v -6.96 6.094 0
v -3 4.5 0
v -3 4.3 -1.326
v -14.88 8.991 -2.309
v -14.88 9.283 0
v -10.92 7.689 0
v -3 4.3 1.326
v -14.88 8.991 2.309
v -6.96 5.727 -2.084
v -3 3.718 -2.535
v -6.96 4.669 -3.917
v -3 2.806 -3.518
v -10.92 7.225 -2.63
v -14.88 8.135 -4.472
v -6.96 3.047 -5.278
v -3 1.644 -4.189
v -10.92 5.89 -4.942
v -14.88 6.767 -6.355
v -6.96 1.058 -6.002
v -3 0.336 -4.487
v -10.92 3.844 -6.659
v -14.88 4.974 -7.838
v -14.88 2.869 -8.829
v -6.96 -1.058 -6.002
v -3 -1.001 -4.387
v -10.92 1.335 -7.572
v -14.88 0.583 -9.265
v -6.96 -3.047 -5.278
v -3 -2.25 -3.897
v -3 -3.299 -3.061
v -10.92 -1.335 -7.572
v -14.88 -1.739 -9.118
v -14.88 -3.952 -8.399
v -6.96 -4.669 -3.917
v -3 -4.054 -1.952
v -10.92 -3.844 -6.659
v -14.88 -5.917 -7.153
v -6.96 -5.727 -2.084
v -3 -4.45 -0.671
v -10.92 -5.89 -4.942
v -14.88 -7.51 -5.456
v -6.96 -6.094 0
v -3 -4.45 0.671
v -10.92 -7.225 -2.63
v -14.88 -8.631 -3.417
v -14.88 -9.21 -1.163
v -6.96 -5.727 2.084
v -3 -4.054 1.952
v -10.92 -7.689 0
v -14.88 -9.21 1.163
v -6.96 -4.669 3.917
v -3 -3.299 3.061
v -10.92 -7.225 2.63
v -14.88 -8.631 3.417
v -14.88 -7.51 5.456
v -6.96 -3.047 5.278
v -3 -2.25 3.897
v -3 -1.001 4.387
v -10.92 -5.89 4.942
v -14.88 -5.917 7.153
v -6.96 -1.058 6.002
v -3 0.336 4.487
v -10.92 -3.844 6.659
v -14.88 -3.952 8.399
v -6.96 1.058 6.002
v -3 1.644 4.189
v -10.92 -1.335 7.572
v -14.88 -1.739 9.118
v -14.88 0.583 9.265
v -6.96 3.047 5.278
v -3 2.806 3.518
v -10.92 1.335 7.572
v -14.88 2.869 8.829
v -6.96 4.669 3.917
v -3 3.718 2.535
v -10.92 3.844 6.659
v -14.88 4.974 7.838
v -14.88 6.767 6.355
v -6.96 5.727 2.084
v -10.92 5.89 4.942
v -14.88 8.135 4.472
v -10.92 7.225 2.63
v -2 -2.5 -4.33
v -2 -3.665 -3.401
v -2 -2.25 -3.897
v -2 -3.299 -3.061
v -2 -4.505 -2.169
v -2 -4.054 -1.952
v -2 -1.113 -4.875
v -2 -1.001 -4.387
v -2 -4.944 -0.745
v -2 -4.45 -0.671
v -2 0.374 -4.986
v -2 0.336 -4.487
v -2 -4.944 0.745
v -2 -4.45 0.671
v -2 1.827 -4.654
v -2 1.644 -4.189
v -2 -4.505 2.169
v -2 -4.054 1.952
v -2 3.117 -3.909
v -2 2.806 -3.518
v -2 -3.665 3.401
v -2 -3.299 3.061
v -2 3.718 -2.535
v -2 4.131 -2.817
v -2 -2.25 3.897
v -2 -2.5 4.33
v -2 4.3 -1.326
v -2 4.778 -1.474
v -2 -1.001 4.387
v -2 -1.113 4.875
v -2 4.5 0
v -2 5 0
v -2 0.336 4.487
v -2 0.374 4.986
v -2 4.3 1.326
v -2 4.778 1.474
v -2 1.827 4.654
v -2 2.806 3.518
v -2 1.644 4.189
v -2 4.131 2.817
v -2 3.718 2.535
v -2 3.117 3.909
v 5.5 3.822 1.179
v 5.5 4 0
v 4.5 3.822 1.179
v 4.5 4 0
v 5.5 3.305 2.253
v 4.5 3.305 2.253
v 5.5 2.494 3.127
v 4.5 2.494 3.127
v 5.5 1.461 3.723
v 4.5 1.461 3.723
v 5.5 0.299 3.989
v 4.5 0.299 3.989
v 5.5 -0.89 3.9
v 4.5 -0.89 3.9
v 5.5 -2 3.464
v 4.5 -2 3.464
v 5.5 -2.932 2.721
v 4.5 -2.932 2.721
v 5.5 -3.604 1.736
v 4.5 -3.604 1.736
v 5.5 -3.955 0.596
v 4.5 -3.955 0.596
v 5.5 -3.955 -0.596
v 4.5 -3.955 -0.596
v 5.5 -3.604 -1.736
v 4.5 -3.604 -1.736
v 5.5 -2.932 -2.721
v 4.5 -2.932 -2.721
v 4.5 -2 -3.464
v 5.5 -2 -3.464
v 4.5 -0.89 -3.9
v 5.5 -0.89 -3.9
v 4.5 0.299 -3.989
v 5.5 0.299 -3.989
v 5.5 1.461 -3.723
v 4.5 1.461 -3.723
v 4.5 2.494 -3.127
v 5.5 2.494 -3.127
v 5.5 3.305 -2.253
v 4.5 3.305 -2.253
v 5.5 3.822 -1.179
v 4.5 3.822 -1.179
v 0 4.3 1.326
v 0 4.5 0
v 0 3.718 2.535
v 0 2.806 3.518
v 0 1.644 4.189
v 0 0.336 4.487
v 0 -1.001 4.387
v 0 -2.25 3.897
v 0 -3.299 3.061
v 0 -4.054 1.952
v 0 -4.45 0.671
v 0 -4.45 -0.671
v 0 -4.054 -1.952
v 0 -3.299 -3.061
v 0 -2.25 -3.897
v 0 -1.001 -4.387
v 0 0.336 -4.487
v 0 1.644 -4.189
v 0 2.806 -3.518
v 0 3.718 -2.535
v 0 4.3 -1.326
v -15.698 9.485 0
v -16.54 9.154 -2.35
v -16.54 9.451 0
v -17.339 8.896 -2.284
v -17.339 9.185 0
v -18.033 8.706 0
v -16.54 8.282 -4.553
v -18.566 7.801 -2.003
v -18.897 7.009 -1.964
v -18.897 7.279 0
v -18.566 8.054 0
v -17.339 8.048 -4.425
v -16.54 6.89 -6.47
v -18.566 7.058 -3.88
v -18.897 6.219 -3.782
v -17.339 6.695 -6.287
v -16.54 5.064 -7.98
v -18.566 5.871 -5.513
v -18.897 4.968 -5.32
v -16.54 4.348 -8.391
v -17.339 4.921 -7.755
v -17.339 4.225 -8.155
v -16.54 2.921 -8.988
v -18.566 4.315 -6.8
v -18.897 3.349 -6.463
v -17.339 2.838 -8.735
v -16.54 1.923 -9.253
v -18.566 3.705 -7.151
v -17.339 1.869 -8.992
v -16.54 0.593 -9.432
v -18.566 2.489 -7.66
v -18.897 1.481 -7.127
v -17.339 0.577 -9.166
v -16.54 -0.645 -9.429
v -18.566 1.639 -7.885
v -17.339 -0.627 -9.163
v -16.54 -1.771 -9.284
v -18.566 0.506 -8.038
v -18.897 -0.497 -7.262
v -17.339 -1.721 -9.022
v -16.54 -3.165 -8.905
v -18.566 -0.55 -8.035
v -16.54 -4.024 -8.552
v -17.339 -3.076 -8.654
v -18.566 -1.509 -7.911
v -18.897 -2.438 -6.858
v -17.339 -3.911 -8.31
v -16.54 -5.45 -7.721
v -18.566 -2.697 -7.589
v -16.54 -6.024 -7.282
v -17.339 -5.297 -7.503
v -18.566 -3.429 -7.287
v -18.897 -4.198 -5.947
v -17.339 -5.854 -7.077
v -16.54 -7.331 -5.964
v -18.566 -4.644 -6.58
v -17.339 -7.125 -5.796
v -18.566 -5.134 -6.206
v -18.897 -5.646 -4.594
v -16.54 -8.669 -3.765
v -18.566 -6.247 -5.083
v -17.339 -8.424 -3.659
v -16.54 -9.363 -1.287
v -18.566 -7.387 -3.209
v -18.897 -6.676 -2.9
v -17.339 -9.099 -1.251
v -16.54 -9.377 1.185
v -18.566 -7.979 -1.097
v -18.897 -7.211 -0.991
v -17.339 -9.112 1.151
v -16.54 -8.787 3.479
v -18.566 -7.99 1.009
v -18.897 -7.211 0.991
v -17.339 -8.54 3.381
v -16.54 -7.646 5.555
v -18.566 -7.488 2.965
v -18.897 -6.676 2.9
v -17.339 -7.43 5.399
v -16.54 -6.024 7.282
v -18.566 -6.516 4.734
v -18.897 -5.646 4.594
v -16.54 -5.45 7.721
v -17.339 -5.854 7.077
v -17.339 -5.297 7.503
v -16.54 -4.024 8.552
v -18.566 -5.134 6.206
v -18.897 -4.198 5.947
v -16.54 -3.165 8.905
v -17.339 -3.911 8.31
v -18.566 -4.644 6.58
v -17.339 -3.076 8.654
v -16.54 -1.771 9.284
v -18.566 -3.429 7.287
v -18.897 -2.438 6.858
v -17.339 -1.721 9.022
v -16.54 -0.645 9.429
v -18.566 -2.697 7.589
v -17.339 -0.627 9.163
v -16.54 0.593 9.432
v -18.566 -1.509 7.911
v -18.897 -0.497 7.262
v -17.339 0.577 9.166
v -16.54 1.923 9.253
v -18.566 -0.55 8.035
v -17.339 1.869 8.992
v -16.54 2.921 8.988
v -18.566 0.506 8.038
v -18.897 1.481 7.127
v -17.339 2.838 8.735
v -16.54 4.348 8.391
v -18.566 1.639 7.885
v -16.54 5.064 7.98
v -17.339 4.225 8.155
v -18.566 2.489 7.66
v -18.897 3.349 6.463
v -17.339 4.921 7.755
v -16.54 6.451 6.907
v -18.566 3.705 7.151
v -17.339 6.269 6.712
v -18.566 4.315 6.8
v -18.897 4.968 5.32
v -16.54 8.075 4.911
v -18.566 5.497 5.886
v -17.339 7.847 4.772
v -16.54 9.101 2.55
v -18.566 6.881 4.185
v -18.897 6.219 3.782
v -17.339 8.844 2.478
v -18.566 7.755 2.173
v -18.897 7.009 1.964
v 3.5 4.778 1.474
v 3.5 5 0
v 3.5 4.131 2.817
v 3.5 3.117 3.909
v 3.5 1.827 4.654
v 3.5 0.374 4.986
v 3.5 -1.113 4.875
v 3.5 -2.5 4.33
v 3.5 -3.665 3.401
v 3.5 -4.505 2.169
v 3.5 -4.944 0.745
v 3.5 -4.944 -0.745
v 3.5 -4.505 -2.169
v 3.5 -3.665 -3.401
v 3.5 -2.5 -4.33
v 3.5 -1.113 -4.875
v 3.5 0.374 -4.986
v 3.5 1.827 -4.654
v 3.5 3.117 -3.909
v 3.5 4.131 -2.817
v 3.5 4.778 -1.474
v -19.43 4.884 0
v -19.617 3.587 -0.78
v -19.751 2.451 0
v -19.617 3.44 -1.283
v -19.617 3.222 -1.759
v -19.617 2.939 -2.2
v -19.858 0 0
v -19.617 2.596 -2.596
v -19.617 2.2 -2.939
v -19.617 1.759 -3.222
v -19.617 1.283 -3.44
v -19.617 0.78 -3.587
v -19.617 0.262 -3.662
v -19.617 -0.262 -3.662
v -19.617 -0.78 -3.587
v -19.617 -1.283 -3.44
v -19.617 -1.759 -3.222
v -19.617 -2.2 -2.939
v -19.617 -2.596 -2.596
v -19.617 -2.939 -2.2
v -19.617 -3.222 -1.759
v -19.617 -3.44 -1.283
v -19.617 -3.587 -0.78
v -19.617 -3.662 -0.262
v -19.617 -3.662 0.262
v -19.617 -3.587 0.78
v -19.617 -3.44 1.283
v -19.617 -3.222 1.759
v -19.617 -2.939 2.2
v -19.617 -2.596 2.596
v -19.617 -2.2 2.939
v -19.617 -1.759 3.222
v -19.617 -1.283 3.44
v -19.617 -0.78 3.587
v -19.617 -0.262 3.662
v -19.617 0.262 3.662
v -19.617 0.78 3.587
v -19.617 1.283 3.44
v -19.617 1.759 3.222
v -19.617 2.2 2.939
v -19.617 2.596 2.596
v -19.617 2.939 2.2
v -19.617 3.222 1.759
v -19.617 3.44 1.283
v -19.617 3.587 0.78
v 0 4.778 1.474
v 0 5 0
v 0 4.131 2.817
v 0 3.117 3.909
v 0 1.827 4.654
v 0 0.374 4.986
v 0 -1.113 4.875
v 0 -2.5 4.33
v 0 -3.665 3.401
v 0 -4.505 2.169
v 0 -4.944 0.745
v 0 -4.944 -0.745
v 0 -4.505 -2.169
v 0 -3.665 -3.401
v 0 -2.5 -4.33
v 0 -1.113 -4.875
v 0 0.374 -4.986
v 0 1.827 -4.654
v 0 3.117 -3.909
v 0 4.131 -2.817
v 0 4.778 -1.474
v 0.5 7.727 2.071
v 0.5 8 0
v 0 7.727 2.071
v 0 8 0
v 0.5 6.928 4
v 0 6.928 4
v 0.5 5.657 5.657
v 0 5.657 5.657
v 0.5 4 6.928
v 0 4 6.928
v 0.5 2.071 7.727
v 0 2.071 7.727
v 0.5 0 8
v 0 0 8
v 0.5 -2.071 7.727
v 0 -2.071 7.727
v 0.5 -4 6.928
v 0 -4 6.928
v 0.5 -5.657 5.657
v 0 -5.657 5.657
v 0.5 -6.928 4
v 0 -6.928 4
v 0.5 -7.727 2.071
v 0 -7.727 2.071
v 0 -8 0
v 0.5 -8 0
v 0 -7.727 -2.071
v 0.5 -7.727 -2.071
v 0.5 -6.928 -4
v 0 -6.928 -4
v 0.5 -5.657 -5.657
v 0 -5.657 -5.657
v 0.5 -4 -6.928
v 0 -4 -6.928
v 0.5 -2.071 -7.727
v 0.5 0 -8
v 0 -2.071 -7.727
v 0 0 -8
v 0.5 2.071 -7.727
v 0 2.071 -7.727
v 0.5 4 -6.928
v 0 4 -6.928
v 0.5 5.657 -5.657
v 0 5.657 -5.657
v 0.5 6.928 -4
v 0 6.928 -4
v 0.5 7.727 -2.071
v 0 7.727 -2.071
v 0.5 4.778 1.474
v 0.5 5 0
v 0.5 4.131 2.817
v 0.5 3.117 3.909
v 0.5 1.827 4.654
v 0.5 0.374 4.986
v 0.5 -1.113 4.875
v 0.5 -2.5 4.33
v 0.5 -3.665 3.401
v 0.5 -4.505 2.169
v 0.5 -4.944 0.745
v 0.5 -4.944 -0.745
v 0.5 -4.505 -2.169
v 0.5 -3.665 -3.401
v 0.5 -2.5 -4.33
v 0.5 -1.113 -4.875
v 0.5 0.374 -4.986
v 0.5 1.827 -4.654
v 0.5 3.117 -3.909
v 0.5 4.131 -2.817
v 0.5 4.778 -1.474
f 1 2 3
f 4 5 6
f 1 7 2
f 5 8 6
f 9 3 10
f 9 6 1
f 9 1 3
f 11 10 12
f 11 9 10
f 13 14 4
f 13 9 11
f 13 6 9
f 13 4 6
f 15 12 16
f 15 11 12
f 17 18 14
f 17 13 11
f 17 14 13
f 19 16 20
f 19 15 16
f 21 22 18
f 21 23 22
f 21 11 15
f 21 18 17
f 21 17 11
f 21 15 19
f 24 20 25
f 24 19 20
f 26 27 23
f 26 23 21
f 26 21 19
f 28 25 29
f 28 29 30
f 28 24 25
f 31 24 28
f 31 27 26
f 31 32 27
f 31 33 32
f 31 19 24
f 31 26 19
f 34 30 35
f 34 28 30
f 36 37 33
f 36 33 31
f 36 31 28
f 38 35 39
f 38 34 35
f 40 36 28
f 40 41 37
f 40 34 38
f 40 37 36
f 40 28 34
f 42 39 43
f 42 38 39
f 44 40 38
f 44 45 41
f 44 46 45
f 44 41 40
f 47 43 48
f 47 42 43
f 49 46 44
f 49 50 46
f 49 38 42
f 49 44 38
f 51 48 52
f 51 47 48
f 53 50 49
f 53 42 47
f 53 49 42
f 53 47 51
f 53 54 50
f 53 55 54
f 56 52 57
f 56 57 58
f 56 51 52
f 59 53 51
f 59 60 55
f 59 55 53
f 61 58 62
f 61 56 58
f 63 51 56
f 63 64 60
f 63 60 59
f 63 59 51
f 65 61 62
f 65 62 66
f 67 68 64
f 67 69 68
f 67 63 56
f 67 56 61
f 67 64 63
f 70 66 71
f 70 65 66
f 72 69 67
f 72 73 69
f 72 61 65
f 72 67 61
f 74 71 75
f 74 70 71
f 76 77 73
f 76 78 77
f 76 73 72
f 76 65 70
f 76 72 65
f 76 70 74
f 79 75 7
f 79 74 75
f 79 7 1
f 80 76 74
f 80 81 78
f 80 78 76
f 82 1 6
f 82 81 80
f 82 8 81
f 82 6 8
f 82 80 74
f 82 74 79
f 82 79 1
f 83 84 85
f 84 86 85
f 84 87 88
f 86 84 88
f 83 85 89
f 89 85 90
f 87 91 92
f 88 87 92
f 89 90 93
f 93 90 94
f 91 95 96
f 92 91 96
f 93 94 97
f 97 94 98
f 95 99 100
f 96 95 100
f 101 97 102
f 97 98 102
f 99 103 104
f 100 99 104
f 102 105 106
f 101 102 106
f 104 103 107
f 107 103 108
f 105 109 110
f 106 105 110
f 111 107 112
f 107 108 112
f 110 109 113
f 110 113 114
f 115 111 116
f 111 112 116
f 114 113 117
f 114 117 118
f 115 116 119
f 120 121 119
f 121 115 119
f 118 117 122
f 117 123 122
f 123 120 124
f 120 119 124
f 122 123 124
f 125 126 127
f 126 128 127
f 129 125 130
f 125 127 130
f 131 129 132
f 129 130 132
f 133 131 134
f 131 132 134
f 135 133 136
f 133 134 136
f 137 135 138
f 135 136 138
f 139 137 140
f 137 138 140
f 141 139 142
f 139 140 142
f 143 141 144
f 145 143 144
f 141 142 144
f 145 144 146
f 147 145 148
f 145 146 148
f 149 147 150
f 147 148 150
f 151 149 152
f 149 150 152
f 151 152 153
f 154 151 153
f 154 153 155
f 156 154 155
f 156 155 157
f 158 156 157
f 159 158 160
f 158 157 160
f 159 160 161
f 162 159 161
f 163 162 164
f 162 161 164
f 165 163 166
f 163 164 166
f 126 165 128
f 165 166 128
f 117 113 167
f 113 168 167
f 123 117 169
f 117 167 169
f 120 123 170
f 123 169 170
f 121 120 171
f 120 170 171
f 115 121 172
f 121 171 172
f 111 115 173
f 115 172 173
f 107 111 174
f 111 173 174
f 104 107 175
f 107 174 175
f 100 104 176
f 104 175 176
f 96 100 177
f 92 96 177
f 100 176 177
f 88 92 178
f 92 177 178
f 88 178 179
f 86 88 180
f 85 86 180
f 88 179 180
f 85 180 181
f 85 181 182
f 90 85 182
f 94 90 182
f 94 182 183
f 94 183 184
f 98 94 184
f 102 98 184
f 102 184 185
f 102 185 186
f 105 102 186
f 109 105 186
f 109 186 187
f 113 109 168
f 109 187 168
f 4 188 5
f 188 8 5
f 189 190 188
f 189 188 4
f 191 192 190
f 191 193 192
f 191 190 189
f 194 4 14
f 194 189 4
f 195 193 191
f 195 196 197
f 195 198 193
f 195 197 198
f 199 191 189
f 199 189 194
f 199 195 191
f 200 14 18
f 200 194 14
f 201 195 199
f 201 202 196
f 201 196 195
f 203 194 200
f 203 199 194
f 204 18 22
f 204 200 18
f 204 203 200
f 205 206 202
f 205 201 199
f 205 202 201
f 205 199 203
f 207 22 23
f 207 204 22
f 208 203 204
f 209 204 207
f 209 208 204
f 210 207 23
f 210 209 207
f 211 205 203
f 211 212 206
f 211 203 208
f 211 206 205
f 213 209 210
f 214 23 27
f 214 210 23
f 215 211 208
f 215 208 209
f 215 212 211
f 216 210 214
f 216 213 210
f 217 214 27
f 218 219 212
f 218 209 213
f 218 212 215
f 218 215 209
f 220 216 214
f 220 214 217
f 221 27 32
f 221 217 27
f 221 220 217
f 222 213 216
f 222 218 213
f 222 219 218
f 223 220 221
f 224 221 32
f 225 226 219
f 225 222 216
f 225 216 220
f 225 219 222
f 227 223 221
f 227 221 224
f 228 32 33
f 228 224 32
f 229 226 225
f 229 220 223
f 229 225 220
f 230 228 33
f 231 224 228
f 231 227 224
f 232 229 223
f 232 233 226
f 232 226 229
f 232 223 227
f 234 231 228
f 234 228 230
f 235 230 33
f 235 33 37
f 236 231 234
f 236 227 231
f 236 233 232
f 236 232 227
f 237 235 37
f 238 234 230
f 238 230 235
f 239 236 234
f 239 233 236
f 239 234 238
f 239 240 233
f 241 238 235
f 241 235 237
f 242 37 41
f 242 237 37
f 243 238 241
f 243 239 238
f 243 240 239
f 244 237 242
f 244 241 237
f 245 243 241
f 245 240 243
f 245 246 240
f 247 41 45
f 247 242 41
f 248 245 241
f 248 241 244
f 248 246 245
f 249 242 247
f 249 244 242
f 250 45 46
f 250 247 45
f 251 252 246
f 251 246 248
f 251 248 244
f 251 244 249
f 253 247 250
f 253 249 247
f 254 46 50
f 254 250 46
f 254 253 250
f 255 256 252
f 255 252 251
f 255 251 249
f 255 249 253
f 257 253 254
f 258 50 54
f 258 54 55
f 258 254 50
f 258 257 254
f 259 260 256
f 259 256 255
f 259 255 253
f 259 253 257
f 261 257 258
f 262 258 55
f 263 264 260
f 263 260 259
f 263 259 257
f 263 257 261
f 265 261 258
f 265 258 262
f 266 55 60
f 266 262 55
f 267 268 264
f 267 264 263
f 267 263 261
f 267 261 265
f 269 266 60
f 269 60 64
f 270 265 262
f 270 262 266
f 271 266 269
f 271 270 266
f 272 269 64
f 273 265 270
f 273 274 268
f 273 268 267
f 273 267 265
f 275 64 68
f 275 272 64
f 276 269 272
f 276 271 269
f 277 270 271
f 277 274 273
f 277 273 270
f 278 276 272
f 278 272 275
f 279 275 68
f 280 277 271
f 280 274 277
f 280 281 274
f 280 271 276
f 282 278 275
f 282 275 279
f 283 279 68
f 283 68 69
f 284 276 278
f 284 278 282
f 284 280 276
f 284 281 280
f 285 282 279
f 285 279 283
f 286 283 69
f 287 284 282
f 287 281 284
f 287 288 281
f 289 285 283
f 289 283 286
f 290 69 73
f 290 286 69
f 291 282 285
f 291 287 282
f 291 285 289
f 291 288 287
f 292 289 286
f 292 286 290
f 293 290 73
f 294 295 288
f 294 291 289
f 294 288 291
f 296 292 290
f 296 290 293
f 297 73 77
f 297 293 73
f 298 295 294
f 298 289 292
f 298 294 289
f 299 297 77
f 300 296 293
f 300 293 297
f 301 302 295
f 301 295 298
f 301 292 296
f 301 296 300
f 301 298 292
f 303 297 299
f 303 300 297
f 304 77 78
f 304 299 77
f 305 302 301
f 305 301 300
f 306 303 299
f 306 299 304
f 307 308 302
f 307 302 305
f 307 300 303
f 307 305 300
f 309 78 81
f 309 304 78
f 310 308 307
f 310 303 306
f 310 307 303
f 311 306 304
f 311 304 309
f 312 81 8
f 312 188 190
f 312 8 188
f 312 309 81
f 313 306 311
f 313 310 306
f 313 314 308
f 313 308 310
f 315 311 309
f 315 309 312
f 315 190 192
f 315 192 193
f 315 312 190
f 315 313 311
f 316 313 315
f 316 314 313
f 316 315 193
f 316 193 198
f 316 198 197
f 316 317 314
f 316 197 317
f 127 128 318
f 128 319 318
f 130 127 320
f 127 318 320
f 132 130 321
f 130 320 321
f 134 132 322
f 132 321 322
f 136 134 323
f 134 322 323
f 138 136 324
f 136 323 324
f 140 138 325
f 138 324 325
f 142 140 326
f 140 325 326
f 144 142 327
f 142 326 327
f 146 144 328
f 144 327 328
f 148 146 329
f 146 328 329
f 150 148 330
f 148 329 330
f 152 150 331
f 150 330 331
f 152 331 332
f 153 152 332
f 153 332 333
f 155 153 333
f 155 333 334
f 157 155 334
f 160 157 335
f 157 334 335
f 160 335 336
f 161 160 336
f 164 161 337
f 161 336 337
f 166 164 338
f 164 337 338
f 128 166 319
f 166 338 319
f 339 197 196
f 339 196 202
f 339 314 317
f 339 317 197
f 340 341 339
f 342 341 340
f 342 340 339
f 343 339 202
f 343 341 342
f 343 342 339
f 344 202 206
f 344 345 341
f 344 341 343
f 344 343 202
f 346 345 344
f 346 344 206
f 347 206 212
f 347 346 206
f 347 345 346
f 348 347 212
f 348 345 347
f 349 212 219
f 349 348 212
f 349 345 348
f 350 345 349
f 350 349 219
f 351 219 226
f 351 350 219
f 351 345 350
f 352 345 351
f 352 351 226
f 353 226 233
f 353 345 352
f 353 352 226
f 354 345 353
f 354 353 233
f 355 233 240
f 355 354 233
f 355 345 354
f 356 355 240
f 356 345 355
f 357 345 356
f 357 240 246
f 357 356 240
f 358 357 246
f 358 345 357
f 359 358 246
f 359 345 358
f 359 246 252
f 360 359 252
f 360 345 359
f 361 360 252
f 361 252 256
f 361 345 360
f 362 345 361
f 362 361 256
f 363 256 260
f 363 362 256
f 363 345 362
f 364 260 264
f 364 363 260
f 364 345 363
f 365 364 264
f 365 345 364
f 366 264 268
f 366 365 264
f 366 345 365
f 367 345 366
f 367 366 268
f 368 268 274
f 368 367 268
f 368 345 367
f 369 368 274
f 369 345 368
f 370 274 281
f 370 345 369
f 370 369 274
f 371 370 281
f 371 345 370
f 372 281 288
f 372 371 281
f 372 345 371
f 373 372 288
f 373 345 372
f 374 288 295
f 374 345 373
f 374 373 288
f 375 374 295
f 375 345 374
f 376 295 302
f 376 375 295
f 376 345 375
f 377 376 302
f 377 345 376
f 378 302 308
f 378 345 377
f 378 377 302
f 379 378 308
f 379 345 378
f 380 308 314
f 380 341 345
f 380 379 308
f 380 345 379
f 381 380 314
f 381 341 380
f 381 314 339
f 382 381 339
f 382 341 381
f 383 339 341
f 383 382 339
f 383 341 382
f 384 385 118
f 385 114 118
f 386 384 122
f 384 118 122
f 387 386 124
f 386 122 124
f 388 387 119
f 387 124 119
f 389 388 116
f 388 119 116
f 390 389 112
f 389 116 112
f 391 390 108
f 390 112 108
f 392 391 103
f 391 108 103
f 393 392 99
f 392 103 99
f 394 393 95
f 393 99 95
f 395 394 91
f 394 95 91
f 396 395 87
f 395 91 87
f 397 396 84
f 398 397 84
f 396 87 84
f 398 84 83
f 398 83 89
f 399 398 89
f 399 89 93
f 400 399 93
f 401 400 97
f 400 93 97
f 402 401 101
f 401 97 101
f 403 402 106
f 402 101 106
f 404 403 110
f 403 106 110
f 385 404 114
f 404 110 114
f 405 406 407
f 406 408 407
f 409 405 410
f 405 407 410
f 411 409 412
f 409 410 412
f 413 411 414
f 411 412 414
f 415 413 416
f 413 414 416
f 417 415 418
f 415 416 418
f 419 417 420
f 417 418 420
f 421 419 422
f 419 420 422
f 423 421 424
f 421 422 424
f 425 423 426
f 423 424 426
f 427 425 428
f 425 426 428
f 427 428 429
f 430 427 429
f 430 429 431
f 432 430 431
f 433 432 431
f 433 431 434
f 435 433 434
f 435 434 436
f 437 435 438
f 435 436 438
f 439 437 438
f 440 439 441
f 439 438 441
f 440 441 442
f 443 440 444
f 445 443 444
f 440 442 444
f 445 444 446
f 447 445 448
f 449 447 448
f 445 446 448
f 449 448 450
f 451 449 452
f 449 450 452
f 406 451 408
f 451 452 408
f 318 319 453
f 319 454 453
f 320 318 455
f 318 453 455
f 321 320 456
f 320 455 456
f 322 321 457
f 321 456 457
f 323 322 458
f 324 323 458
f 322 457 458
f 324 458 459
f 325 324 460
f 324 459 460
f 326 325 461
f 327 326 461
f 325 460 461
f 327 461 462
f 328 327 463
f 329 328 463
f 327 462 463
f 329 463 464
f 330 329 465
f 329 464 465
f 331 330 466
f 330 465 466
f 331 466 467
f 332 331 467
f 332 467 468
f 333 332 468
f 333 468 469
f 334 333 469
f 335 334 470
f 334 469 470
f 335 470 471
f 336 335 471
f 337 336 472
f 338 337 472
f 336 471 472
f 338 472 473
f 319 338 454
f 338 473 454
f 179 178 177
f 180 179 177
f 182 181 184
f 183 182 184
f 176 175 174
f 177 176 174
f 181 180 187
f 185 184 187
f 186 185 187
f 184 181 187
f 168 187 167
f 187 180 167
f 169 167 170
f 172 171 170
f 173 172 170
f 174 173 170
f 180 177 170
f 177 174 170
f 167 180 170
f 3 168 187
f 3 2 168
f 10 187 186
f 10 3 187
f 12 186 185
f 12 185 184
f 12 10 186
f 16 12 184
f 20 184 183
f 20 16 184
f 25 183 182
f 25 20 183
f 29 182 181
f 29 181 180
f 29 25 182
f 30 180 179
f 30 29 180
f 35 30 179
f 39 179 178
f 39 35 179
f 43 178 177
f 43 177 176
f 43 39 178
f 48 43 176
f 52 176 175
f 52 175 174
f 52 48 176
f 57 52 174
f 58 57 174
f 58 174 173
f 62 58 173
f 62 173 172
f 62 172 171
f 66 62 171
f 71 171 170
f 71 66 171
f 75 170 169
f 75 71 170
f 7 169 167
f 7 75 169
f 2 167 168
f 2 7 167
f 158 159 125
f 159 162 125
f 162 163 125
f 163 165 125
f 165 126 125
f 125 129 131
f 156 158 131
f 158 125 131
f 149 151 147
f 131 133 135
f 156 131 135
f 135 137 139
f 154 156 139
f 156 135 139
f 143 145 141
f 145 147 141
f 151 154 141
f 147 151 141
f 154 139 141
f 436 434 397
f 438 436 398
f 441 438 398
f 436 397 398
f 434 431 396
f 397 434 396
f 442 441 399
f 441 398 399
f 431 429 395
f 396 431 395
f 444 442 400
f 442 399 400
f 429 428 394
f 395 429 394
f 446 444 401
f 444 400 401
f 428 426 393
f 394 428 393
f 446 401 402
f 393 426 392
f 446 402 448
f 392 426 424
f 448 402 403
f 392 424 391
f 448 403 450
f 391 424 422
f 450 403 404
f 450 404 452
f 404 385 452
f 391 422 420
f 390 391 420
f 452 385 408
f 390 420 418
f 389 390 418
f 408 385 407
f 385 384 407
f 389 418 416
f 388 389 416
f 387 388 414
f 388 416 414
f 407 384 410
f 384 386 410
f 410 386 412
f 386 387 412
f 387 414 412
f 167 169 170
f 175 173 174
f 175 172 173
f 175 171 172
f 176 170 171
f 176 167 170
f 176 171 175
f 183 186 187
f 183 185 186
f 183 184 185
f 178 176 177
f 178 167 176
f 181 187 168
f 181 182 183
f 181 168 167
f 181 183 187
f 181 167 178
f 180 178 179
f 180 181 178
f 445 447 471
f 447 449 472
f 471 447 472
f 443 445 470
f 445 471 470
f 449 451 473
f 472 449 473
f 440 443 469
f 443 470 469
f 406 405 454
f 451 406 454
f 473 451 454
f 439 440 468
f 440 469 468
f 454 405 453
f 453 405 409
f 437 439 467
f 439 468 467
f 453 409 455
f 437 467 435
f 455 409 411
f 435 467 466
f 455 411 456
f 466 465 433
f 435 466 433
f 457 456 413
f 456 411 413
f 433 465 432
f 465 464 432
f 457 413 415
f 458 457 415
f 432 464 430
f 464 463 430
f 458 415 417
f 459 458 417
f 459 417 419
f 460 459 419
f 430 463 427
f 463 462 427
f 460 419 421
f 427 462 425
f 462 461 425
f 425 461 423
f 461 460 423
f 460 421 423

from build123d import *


with BuildPart() as part:
    # Sketch1 → Revolve1 (revolve)
    with BuildSketch(Plane.XY):
        Polygon((0, 4.5), (0, 0), (5.5, 0), (5.5, 4), (4.5, 4), (3.5, 5), (0.5, 5), (0.5, 8), (0, 8), (0, 5), (-2, 5), (-2, 4.5), align=None)
    revolve(axis=Axis((0, 0, 0), (1, 0, 0)))


with BuildPart() as body_2:
    # Sketch2 → Revolve2 (revolve)
    with BuildSketch(Plane.XY):
        with BuildLine():
            Line((0, 0), (0, 4.5))
            Line((0, 4.5), (-3, 4.5))
            Line((-3, 4.5), (-14.879552076, 9.282911506))
            ThreePointArc((-14.879552076, 9.282911506), (-17.339156162, 9.184522448), (-18.897161062, 7.278753994))
            ThreePointArc((-18.897161062, 7.278753994), (-19.617023423, 3.670972882), (-19.858362338, 0))
            Line((-19.858362338, 0), (0, 0))
        make_face()
    revolve(axis=Axis((0, 0, 0), (-1, 0, 0)))


solid = Compound([part.part, body_2.part])
